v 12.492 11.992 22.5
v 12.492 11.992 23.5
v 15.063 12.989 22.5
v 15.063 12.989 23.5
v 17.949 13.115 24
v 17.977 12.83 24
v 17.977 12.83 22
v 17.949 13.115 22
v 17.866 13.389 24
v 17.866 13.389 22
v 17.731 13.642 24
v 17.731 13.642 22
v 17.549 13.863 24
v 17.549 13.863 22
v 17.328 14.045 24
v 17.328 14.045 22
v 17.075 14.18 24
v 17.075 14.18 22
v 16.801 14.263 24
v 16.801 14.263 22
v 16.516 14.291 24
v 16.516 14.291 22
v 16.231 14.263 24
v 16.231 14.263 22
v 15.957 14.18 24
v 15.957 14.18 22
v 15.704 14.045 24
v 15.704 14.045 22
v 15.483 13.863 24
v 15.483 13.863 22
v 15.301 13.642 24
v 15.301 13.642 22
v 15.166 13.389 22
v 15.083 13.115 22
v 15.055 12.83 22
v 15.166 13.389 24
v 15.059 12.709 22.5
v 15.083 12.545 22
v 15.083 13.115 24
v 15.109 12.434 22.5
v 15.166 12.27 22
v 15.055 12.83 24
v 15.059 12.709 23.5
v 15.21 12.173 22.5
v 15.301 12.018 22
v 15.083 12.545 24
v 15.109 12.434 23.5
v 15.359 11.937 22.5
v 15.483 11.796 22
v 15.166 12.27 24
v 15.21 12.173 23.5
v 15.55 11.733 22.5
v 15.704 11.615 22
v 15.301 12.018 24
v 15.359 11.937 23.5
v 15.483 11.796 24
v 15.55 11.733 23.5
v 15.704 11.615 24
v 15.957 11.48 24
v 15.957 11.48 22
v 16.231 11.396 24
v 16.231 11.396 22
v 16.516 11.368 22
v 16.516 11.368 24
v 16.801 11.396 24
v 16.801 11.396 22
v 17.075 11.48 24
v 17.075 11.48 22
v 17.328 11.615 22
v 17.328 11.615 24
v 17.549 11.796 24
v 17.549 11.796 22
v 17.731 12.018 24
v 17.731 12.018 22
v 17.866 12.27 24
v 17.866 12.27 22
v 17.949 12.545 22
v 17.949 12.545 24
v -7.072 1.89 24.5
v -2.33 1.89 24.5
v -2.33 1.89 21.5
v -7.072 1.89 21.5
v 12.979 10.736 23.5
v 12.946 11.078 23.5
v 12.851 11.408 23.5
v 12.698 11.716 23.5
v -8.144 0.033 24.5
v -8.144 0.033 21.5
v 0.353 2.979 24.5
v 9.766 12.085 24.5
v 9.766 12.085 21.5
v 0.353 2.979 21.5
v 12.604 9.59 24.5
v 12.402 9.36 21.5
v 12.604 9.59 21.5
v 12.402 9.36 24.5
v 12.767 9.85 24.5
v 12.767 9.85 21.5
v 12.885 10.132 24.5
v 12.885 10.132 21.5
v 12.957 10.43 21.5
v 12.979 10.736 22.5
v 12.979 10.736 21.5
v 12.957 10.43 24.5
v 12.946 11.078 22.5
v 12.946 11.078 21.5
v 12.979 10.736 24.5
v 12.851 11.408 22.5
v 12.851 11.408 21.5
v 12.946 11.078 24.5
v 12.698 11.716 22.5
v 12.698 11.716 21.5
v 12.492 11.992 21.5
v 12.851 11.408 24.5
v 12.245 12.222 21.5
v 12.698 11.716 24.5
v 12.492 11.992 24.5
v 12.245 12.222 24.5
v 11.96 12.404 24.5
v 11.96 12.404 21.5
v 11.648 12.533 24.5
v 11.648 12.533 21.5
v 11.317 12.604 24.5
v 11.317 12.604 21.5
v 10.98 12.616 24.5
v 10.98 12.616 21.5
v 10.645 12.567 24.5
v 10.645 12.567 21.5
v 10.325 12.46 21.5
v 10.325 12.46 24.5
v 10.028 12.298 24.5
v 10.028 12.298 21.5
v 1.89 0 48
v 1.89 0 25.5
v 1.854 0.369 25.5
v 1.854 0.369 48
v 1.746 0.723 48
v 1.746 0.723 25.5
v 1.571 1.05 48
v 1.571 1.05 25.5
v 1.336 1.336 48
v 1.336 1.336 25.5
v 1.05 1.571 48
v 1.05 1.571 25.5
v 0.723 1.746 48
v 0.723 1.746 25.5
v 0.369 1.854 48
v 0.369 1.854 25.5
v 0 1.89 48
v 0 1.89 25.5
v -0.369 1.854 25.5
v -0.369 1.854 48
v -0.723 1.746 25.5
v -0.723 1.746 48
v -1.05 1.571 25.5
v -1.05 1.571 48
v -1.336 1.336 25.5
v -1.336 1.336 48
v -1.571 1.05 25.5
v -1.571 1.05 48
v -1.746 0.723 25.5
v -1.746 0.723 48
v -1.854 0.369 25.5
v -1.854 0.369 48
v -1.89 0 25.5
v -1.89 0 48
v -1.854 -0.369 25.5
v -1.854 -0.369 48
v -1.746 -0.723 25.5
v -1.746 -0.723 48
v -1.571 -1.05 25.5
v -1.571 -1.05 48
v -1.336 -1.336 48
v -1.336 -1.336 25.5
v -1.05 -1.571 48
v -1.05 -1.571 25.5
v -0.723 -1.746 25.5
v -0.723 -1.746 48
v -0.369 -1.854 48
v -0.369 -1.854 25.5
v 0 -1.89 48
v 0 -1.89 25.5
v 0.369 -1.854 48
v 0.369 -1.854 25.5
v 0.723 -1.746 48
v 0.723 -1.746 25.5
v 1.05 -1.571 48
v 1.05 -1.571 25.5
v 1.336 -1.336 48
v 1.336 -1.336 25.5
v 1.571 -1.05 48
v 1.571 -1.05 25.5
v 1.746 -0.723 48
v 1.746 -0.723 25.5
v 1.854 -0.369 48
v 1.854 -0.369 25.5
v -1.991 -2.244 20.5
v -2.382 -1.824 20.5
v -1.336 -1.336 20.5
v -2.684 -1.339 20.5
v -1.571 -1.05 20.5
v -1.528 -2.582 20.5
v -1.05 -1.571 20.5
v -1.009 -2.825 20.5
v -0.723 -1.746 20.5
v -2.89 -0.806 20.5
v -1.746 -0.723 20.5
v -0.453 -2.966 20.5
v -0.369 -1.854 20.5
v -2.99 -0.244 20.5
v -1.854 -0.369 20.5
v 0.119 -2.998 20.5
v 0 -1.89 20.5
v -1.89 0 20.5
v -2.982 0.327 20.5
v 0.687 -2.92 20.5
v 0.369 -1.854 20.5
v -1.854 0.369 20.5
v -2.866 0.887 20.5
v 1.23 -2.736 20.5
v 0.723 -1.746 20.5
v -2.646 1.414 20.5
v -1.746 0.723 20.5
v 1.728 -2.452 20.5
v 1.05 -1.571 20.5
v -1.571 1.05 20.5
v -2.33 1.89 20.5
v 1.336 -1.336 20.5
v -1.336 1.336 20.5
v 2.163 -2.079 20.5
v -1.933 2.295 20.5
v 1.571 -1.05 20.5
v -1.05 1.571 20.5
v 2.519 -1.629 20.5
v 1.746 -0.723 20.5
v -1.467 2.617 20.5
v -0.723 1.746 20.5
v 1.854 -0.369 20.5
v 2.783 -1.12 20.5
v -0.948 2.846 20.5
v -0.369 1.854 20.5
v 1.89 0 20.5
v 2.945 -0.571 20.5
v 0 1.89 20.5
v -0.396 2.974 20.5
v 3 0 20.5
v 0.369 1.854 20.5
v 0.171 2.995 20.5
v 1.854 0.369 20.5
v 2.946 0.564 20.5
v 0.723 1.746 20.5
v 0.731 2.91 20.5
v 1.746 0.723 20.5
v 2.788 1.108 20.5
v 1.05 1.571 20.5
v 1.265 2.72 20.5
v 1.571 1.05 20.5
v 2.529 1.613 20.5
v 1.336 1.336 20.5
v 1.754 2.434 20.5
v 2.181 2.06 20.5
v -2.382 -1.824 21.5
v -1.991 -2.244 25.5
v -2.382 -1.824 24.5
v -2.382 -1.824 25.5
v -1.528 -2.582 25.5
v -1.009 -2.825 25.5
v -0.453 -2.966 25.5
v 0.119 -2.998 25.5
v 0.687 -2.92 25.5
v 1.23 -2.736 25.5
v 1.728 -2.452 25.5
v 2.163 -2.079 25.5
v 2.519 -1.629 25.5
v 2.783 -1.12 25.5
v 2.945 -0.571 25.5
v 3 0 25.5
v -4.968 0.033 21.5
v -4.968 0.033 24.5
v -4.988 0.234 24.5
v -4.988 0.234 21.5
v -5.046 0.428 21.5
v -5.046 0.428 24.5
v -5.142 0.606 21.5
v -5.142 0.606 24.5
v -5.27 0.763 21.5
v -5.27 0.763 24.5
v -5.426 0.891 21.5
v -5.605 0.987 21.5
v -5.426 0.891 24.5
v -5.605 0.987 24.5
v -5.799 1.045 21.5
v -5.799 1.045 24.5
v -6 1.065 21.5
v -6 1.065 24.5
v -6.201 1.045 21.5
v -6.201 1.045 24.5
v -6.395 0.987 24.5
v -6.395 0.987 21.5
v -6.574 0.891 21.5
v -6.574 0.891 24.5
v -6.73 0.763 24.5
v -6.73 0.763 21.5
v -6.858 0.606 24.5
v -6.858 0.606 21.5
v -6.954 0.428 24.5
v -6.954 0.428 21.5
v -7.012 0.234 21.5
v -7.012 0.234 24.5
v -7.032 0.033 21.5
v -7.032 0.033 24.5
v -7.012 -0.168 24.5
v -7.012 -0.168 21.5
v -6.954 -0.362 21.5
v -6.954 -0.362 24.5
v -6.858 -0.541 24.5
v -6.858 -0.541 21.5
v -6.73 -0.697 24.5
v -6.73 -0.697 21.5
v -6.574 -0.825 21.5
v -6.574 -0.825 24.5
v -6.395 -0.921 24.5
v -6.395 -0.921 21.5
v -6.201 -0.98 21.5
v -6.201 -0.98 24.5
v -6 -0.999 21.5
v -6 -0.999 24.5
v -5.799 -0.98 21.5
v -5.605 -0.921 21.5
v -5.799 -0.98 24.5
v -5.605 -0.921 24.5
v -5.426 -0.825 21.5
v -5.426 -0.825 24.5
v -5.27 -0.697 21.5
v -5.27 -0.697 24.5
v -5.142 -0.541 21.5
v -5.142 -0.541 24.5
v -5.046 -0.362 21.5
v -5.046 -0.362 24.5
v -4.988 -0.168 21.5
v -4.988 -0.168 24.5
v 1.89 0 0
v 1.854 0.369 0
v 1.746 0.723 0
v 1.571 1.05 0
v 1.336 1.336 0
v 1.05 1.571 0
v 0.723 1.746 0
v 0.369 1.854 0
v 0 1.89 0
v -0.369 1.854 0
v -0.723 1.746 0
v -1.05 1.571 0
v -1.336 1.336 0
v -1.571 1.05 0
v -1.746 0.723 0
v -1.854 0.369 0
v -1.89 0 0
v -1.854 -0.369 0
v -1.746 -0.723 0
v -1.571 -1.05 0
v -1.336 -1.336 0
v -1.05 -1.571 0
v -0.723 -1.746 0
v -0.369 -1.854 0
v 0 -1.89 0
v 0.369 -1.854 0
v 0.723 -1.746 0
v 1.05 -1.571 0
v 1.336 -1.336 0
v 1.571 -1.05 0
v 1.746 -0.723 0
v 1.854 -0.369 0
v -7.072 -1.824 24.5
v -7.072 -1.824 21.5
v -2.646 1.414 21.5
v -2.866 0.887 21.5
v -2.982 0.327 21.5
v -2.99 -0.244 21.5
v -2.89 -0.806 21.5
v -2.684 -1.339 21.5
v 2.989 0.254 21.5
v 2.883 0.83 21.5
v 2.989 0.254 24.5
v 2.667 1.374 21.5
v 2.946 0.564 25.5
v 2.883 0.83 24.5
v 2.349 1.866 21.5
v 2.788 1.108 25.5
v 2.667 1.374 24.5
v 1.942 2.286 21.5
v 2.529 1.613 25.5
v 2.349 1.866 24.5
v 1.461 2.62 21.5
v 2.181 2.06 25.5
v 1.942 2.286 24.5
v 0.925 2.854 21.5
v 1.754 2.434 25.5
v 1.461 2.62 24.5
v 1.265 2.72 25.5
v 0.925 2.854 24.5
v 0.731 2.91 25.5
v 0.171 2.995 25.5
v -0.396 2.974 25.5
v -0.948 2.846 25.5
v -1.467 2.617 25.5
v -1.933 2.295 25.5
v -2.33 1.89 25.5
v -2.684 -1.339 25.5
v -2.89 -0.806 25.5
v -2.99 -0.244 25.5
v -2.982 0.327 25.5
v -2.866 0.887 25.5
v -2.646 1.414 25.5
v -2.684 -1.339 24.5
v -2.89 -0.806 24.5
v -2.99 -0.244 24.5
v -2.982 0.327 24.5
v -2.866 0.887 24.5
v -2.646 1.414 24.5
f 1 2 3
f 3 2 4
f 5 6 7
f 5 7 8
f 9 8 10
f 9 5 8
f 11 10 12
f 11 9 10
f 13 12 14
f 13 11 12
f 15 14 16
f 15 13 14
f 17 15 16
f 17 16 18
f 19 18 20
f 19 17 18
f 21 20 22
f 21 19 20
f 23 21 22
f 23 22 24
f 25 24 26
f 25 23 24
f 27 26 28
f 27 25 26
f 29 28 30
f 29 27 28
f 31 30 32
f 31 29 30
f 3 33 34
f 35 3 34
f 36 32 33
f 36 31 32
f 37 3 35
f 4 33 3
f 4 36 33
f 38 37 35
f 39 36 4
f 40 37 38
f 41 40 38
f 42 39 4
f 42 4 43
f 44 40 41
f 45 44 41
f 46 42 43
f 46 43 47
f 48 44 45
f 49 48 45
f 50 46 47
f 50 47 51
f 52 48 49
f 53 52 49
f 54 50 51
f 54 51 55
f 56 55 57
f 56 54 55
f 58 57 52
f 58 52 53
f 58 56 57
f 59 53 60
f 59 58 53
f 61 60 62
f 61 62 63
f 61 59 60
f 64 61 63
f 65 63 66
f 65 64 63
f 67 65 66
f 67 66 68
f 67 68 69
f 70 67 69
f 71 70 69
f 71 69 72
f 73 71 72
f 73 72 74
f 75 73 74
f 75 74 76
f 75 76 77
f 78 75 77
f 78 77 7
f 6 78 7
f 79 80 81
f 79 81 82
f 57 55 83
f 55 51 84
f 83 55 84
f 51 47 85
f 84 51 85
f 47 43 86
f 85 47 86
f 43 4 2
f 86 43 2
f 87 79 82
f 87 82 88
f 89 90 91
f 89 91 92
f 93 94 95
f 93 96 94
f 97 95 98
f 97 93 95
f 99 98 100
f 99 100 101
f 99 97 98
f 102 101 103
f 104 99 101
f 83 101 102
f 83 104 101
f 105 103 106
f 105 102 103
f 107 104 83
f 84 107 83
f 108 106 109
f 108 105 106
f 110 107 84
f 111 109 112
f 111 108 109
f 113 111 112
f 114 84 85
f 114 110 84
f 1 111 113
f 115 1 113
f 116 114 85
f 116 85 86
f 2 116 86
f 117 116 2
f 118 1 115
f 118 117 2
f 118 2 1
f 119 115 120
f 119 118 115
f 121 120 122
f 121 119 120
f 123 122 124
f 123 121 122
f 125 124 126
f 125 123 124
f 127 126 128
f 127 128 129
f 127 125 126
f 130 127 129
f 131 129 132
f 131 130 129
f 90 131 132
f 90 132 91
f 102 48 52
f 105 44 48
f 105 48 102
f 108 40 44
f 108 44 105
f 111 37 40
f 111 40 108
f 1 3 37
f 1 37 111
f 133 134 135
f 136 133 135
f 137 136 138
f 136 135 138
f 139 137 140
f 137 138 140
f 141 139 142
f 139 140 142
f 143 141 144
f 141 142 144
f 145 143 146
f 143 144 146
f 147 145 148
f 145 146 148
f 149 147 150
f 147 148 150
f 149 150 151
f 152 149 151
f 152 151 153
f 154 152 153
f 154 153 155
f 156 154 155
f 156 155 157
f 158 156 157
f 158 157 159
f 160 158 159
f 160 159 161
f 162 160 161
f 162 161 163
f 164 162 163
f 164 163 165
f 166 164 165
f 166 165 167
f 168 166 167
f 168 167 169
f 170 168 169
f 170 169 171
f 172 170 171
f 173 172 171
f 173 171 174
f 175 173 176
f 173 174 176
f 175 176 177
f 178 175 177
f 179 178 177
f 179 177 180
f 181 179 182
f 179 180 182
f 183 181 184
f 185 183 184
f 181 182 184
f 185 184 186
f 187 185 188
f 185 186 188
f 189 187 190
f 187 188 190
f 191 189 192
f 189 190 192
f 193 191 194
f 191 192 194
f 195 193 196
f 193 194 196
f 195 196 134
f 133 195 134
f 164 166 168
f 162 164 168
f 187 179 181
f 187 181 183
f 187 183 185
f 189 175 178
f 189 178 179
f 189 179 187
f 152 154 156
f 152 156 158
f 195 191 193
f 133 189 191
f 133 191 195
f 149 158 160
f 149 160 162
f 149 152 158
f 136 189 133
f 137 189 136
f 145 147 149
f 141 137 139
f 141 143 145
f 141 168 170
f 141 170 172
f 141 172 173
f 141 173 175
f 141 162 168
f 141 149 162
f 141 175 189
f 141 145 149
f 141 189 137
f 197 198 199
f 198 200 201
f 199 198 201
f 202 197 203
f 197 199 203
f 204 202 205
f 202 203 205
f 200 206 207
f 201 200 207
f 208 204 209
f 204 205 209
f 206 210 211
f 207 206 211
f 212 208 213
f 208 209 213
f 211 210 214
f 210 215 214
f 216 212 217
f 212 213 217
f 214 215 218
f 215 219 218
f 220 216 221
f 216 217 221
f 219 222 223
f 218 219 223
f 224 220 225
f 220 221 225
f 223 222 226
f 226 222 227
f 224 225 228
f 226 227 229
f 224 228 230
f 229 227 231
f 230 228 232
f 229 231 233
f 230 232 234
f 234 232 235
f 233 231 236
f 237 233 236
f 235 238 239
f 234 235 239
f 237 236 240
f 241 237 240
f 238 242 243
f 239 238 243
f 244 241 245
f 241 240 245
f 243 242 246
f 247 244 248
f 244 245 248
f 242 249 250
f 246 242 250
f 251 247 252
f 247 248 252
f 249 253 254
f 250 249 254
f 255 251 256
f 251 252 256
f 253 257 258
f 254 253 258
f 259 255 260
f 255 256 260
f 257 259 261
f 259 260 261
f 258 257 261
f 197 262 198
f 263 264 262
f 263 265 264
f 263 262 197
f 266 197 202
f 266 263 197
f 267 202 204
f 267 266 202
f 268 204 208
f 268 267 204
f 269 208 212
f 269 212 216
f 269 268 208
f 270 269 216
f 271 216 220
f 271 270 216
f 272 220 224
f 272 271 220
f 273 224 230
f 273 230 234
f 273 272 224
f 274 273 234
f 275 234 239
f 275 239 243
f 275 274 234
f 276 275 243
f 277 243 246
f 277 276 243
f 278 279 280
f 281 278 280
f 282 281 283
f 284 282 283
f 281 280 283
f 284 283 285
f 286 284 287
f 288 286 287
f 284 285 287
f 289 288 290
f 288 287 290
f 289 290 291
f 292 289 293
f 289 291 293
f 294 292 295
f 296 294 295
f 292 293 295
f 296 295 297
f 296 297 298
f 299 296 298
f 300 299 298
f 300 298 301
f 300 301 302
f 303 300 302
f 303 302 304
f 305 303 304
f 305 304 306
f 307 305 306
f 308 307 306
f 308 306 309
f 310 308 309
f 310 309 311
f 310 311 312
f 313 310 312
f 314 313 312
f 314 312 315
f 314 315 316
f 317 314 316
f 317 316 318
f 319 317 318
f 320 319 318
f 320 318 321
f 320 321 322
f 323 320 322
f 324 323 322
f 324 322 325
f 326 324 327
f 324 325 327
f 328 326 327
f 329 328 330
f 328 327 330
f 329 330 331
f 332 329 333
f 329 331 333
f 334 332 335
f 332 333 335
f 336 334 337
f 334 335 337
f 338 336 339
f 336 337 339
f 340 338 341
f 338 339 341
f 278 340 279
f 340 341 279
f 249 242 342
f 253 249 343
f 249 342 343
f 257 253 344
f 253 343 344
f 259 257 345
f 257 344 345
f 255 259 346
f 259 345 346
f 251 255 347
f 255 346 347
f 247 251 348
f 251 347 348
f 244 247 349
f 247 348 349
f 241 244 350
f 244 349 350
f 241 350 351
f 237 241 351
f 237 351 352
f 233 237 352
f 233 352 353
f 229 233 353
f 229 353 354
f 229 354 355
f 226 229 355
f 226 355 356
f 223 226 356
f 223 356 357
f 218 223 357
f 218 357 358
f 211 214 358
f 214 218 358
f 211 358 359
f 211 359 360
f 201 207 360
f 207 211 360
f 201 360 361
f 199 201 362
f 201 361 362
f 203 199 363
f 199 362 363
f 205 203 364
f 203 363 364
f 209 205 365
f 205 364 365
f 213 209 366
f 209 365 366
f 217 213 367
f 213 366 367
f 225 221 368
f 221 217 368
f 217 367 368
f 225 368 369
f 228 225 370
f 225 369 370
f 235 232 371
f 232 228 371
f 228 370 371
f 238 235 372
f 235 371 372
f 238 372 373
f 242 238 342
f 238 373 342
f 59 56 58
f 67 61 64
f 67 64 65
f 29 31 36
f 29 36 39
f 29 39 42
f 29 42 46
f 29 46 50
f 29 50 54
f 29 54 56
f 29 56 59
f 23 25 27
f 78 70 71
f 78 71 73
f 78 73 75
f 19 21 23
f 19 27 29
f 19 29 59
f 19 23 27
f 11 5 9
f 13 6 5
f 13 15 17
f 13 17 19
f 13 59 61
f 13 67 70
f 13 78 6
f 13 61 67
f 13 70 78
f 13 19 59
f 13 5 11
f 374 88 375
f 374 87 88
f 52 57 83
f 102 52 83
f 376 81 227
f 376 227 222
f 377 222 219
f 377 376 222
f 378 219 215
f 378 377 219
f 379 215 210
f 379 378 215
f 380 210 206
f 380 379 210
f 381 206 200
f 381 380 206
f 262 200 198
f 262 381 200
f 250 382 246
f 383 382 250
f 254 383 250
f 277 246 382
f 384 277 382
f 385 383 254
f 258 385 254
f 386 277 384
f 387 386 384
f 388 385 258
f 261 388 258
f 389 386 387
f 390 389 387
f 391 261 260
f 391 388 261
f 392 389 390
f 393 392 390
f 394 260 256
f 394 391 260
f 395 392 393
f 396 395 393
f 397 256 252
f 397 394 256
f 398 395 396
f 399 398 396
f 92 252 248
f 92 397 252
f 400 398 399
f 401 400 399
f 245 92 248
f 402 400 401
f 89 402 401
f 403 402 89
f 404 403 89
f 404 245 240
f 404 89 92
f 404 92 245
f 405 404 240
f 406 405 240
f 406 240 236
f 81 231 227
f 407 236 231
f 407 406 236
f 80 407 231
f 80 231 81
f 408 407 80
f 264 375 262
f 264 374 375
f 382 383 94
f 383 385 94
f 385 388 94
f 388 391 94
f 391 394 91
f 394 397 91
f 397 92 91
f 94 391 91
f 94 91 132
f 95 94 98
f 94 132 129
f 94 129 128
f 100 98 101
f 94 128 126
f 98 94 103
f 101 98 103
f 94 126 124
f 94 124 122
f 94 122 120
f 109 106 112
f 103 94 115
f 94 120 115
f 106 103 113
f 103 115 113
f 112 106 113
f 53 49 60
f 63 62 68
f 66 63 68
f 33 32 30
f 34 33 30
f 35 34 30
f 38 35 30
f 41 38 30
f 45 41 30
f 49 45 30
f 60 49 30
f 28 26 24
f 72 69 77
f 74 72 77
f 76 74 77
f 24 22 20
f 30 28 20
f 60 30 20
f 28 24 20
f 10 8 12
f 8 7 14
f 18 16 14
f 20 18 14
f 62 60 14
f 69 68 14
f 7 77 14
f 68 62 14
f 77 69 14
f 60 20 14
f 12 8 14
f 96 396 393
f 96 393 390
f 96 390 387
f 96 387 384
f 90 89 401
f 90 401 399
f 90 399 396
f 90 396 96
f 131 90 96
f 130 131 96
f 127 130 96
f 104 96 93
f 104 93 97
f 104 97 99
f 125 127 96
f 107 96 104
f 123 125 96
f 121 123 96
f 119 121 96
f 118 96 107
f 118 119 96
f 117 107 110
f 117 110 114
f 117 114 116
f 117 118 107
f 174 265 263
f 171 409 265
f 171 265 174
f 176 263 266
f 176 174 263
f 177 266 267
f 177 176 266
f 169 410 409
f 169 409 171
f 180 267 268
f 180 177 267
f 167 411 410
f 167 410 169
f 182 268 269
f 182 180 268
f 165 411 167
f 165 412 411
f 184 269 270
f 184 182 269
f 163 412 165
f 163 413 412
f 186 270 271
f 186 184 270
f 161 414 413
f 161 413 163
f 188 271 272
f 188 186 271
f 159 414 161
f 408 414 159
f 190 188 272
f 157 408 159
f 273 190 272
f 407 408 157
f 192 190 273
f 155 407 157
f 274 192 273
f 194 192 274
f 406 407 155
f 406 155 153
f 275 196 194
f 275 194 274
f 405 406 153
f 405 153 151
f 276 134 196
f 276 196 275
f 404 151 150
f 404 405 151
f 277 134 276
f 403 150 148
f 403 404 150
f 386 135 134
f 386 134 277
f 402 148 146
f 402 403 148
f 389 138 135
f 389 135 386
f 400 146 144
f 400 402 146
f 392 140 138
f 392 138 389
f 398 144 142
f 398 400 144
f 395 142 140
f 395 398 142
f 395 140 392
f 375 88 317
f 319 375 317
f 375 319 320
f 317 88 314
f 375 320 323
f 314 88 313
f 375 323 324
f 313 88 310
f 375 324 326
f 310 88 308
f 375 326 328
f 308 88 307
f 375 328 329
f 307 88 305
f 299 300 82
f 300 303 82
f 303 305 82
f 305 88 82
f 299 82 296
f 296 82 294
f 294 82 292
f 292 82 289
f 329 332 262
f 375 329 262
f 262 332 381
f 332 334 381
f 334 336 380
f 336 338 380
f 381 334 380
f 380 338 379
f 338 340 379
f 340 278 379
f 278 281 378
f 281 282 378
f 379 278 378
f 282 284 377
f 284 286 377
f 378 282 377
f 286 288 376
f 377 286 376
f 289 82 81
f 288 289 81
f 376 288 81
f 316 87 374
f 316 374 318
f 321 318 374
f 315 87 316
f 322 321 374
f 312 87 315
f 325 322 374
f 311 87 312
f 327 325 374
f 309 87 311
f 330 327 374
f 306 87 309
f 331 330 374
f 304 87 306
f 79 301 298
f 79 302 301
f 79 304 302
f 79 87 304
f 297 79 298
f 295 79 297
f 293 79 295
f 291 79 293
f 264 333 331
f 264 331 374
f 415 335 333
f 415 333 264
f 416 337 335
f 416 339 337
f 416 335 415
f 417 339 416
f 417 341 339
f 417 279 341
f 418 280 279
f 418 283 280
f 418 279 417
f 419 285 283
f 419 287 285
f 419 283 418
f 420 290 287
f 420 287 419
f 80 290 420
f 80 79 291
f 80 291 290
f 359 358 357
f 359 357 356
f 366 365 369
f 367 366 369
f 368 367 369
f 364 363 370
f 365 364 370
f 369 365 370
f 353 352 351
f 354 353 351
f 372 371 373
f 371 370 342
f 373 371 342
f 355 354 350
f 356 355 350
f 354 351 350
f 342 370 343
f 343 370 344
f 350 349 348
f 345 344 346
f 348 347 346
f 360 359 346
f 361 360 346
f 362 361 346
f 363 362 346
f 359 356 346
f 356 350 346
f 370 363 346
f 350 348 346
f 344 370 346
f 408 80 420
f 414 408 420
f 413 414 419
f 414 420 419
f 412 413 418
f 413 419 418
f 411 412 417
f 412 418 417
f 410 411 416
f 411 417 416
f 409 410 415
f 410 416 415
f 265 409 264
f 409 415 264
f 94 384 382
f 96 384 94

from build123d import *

# Parameters (mm, degrees)
IZIM1_R                     = 1.89
Y_KSEKLIK_EKSTR_ZYON1_DEPTH = 48
IZIM2_R                     = 3
Y_KSEKLIK_EKSTR_ZYON2_DEPTH = 2.5
Y_KSEKLIK_EKSTR_ZYON3_DEPTH = 1.5
Y_KSEKLIK_EKSTR_ZYON7_DEPTH = 1.5
Y_KSEKLIK_EKSTR_ZYON8_DEPTH = 0.5
IZIM6_4_R                   = 1.461469514
Y_KSEKLIK_EKSTR_ZYON9_DEPTH = 1
IZIM8_R                     = 1.032330659
KES_EKSTR_ZYON1_DEPTH       = 4


with BuildPart() as part:
    # Çizim1 → Yükseklik-Ekstrüzyon1 (new body)
    with BuildSketch(Plane.XY):
        Circle(IZIM1_R)
    extrude(amount=Y_KSEKLIK_EKSTR_ZYON1_DEPTH)

    # Çizim2 → Yükseklik-Ekstrüzyon2 (add, symmetric)
    with BuildSketch(Plane.XY.offset(23)):
        Circle(IZIM2_R)
    extrude(amount=Y_KSEKLIK_EKSTR_ZYON2_DEPTH, both=True)

    # Çizim2<3> → Yükseklik-Ekstrüzyon3 (add, symmetric)
    with BuildSketch(Plane.XY.offset(23)):
        Polygon((0, -1.824067041), (0, 1.89), (-7.072158803, 1.89), (-8.144317606, 0.03296648), (-7.072158803, -1.824067041), align=None)
    extrude(amount=Y_KSEKLIK_EKSTR_ZYON3_DEPTH, both=True)

    # Çizim6 → Yükseklik-Ekstrüzyon7 (add, symmetric)
    with BuildSketch(Plane.XY.offset(23)):
        with BuildLine():
            Line((9.765618481, 12.085389192), (-1.318138223, 1.362498594))
            ThreePointArc((-1.318138223, 1.362498594), (-1.362498594, -1.318138223), (1.318138223, -1.362498594))
            Line((1.318138223, -1.362498594), (12.401894927, 9.360392003))
            ThreePointArc((12.401894927, 9.360392003), (12.446255298, 12.04102882), (9.765618481, 12.085389192))
        make_face()
    extrude(amount=Y_KSEKLIK_EKSTR_ZYON7_DEPTH, both=True)

    # Çizim6<3> → Yükseklik-Ekstrüzyon8 (add, symmetric)
    with BuildSketch(Plane.XY.offset(23)):
        with BuildLine():
            Line((10.840169306, 11.350935213), (16.272383955, 13.457822202))
            ThreePointArc((16.272383955, 13.457822202), (17.144015968, 13.073364985), (16.75955875, 12.201732972))
            Line((16.75955875, 12.201732972), (11.327344102, 10.094845982))
            ThreePointArc((11.327344102, 10.094845982), (10.455712089, 10.4793032), (10.840169306, 11.350935213))
        make_face()
    extrude(amount=Y_KSEKLIK_EKSTR_ZYON8_DEPTH, both=True)

    # Çizim6<4> → Yükseklik-Ekstrüzyon9 (add, symmetric)
    with BuildSketch(Plane.XY.offset(23)):
        with Locations((16.515971352, 12.829777587)):
            Circle(IZIM6_4_R)
    extrude(amount=Y_KSEKLIK_EKSTR_ZYON9_DEPTH, both=True)

    # Çizim8 → Kes-Ekstrüzyon1 (cut)
    with BuildSketch(Plane.XY.offset(24.5)):
        with Locations((-6, 0.03296648)):
            Circle(IZIM8_R)
    extrude(amount=-KES_EKSTR_ZYON1_DEPTH, mode=Mode.SUBTRACT)


solid = part.part
